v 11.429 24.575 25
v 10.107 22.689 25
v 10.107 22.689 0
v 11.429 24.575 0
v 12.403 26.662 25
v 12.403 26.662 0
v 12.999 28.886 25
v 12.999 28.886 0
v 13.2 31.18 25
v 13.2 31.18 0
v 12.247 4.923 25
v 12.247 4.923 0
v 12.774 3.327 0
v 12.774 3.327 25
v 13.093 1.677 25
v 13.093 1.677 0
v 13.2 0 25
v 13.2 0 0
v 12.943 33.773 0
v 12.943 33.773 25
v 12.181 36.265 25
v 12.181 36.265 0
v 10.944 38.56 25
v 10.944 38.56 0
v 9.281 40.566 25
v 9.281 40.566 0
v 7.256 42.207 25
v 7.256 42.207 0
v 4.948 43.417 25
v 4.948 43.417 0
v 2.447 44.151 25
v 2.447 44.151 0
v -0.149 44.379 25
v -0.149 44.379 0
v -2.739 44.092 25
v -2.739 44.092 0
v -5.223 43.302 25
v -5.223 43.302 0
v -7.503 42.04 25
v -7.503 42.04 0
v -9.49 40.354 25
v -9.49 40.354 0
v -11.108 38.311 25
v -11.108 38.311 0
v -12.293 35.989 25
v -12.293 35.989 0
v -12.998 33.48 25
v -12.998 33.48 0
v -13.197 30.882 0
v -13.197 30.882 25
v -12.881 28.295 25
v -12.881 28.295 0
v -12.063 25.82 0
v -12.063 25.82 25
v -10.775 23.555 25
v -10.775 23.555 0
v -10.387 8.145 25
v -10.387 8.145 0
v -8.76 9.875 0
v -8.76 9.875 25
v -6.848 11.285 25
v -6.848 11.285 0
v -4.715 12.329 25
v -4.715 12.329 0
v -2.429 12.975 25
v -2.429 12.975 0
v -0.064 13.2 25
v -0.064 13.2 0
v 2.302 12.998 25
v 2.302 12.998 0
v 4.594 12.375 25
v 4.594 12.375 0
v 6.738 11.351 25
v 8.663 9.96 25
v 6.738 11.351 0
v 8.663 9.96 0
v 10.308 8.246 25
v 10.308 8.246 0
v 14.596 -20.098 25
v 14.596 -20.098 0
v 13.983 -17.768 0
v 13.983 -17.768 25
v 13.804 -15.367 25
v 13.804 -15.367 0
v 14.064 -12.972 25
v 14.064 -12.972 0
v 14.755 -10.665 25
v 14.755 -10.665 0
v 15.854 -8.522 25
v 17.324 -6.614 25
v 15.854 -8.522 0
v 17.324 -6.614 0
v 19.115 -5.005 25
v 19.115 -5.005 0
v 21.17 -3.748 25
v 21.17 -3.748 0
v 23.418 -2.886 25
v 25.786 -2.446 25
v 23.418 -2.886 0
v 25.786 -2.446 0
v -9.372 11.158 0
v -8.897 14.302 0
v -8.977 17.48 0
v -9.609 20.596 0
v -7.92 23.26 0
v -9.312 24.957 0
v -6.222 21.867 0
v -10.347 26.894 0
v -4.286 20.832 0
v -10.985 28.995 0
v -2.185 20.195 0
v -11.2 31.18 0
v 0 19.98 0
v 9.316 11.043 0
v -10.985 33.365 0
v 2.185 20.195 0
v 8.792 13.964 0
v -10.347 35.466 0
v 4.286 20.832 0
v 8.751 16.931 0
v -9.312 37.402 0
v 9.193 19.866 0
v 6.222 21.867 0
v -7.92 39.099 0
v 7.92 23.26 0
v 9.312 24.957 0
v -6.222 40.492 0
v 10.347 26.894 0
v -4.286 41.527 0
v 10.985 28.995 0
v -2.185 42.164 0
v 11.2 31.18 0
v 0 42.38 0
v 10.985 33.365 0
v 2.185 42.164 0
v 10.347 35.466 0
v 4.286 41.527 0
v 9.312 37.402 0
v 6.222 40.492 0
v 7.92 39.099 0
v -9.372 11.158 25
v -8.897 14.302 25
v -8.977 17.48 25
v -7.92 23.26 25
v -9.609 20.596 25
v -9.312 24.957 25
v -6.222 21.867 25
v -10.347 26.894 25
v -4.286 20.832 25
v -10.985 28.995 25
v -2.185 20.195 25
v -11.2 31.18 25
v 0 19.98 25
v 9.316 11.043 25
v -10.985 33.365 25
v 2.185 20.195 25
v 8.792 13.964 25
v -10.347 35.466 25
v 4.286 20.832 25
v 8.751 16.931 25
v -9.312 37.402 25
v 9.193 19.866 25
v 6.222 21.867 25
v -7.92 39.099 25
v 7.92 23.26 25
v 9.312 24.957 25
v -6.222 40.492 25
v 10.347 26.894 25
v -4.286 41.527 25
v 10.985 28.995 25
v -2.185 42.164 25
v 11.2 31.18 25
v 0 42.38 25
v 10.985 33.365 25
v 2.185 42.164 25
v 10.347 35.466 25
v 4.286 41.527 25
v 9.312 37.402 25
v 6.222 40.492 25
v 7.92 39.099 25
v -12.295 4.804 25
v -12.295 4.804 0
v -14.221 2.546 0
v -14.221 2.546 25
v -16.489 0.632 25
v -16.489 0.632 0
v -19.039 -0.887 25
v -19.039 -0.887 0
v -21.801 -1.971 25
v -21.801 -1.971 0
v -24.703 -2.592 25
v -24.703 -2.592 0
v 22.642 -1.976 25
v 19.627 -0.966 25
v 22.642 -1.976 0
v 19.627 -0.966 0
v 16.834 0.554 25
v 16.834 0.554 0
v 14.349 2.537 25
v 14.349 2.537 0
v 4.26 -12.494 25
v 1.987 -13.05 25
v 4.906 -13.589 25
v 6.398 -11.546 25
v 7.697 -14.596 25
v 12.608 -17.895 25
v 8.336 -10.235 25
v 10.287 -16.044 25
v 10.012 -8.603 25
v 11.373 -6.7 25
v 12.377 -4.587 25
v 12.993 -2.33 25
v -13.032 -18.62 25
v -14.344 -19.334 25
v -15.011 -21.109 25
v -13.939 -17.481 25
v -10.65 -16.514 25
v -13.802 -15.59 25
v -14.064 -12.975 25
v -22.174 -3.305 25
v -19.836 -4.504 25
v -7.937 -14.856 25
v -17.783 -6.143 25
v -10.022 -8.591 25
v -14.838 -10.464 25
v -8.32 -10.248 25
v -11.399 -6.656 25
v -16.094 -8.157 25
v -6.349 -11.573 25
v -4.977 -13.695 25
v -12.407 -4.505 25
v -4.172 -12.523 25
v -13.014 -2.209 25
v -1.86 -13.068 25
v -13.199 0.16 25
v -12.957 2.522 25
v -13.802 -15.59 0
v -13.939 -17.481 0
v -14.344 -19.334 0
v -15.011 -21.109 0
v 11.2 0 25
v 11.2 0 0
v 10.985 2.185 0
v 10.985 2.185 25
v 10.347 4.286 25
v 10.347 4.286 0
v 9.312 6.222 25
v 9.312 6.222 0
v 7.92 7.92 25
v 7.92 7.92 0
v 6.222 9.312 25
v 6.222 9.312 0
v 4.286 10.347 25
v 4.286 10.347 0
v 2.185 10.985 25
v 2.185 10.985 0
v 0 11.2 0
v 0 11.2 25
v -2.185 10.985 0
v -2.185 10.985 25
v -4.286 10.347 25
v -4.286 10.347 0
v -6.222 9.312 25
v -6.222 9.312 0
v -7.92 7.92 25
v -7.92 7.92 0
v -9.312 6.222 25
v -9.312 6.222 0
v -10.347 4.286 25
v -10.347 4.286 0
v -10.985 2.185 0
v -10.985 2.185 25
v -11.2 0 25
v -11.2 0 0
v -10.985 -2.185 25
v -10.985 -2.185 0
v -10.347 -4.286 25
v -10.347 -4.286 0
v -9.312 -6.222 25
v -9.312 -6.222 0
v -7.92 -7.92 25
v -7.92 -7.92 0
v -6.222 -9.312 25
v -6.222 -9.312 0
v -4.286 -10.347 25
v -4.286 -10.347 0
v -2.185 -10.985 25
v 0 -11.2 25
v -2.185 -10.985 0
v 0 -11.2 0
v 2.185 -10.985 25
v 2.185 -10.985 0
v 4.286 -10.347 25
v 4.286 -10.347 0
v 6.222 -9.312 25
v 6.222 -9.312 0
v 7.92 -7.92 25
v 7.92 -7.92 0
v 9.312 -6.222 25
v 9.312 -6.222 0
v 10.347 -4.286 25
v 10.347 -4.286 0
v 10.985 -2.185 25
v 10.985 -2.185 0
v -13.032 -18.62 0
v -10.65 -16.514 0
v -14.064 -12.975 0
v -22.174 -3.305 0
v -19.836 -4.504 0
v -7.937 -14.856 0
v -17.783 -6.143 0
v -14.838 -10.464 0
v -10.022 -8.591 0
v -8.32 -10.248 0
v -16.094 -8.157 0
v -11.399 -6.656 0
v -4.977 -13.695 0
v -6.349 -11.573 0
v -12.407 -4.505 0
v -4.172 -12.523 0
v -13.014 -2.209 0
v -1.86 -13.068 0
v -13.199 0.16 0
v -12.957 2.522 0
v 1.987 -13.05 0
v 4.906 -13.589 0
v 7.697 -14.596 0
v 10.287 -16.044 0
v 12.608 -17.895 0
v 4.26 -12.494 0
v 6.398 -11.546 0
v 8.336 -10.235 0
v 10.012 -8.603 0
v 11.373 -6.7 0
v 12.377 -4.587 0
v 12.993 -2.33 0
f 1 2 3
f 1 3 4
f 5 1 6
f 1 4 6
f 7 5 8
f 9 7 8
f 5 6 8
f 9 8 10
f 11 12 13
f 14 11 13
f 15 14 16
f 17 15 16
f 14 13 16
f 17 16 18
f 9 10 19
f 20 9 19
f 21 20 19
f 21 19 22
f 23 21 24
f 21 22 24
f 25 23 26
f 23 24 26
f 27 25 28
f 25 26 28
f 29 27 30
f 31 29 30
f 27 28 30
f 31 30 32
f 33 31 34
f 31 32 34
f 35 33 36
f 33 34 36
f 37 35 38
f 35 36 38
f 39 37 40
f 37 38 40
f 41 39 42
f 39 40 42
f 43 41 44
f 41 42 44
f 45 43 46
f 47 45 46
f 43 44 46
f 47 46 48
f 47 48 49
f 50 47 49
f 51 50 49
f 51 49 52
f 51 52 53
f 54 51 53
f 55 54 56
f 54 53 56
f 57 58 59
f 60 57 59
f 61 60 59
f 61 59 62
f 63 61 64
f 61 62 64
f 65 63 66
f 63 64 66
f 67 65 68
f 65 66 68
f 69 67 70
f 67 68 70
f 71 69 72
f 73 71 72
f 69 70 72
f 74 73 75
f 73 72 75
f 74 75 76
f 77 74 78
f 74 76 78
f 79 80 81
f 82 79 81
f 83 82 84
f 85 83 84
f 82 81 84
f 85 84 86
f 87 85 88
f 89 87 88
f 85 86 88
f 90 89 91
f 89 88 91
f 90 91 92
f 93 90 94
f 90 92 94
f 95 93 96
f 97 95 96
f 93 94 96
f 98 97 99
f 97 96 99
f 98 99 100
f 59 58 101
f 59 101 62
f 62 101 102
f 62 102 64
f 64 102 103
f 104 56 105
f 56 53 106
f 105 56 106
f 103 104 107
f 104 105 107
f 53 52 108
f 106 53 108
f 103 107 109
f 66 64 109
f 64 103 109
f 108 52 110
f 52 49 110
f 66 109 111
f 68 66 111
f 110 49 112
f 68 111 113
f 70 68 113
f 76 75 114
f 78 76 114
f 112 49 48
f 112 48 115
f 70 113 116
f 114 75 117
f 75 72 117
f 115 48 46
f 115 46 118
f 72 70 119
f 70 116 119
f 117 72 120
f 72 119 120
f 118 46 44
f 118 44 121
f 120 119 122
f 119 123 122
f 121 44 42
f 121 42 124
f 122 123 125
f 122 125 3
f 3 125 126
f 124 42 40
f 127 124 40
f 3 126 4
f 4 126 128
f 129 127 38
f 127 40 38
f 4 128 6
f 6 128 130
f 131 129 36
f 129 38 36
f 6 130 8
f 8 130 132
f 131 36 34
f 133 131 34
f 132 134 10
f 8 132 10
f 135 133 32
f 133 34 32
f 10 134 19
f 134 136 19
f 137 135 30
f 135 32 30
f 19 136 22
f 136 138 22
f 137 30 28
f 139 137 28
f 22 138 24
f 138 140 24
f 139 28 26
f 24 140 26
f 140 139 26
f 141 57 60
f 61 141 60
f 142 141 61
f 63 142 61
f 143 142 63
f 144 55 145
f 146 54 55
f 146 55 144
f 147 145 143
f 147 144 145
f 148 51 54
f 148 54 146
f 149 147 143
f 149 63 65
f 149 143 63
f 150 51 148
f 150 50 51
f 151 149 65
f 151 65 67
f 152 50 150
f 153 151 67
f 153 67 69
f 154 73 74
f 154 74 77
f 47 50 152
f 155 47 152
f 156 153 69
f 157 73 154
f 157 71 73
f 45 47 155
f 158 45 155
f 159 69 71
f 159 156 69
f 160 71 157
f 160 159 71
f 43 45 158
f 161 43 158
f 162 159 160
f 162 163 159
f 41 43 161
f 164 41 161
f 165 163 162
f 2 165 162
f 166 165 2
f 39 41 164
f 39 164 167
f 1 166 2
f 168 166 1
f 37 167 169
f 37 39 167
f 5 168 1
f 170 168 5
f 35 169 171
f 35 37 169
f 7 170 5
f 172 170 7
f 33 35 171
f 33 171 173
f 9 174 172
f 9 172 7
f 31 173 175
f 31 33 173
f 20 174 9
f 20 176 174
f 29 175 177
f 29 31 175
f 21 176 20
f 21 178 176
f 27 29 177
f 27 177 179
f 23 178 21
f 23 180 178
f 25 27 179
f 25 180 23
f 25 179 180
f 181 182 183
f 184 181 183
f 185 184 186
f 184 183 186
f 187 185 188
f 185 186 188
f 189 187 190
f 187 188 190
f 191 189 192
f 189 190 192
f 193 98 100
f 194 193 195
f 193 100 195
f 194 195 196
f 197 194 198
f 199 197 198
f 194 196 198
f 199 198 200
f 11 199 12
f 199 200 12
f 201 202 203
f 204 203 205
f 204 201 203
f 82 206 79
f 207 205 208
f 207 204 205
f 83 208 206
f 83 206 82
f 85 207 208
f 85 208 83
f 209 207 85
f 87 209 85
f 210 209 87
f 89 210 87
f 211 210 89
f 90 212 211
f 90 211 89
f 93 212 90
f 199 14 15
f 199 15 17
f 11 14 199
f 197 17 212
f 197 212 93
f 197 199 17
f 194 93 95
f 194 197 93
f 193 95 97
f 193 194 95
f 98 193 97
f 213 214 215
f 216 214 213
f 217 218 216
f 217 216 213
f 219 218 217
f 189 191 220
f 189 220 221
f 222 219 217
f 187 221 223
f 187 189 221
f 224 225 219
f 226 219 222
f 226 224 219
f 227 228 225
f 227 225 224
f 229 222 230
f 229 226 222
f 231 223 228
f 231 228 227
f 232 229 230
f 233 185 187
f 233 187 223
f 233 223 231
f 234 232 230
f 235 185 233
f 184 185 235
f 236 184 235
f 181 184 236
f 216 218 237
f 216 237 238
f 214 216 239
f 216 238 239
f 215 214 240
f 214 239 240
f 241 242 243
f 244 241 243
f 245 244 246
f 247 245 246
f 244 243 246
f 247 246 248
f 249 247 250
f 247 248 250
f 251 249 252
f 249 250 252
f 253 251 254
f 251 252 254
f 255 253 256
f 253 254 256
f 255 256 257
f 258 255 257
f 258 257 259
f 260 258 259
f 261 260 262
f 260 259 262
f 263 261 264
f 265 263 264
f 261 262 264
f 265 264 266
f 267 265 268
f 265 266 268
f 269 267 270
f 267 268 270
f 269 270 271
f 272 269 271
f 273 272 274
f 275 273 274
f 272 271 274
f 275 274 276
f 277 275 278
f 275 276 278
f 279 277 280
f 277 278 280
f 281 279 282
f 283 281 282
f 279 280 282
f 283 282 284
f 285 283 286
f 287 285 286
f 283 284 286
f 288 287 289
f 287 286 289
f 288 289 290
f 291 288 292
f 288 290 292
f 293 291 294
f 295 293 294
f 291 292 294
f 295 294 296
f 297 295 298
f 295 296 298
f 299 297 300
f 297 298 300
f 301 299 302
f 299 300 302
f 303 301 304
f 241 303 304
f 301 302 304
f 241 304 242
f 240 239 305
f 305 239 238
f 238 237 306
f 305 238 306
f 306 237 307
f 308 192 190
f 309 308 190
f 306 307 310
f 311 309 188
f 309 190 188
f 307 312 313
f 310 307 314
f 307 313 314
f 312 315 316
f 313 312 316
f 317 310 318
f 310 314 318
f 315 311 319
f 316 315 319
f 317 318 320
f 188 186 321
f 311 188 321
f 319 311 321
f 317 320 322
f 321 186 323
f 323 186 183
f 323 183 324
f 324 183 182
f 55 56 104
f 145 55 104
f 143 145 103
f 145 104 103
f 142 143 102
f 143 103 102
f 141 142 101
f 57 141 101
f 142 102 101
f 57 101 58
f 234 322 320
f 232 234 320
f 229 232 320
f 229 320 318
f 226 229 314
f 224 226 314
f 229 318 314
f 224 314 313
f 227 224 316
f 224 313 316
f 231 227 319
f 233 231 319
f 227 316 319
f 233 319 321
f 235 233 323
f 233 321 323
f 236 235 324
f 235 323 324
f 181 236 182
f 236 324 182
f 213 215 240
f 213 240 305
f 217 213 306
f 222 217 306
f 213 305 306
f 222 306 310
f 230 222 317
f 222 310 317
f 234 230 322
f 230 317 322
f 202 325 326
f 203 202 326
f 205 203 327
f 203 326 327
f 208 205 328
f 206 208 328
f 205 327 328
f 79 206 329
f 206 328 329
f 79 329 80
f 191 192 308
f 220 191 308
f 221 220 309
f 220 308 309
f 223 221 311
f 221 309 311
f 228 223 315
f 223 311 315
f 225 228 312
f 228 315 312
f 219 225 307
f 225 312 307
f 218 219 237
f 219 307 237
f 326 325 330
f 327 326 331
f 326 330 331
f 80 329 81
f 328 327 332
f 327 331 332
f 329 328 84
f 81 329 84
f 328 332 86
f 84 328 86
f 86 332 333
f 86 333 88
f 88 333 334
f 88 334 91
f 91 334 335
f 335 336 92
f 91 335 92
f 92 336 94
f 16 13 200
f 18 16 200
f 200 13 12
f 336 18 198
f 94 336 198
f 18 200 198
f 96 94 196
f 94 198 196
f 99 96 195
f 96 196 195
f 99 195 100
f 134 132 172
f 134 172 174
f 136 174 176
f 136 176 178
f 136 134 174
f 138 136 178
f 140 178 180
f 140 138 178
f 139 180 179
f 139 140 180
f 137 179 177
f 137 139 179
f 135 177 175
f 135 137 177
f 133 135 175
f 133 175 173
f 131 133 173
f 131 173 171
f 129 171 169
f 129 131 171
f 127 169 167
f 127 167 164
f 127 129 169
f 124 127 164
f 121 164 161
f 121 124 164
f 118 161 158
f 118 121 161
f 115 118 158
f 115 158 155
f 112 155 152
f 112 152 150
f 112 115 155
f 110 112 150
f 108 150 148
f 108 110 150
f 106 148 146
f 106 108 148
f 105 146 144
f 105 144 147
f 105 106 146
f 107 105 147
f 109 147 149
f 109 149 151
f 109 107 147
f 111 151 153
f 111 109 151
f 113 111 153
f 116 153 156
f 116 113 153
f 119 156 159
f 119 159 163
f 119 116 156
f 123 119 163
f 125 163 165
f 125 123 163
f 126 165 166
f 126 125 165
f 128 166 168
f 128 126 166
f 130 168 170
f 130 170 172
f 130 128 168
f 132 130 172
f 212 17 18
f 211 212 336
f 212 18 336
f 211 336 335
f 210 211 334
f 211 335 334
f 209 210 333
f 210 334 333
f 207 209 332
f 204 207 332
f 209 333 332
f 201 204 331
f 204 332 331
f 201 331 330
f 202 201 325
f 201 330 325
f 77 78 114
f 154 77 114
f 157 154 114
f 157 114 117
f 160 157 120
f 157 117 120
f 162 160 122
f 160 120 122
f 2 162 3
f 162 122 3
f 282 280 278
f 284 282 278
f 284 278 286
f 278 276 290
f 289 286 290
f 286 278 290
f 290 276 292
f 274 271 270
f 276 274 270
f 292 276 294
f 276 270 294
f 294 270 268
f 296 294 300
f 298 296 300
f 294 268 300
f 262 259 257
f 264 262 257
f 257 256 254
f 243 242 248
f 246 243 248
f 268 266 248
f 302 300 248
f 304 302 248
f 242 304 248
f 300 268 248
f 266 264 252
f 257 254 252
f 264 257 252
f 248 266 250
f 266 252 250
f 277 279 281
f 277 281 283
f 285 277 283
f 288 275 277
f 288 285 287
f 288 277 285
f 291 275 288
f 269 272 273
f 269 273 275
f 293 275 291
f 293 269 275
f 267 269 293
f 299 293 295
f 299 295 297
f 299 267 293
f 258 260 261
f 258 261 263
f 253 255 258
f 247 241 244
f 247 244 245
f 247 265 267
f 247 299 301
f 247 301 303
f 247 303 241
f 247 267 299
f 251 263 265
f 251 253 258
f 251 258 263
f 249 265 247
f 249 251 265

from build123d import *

# Parameters (mm, degrees)
F0_R     = 11.2
F2_DEPTH = 25


with BuildPart() as f2:
    # F0 (on Top) → F2 (new body)
    with BuildSketch(Plane.XY):
        with BuildLine():
            ThreePointArc((-10.7748828951, 23.5545960435), (-0.5465539807, 17.9909996106), (10.1070365837, 22.6892254181))
            ThreePointArc((10.1070365837, 22.6892254181), (12.4026788015, 26.6615429343), (13.2, 31.1796795577))
            ThreePointArc((13.2, 31.1796795577), (-4.0007215465, 43.7587982513), (-10.7748828951, 23.5545960435))
        make_face()
        with Locations((0, 31.1796795577)):
            Circle(F0_R, mode=Mode.SUBTRACT)
        with BuildLine():
            ThreePointArc((-10.3874815396, 8.144951029), (-0.0643990559, 13.1998429067), (10.3075141907, 8.2459172448))
            ThreePointArc((10.3075141907, 8.2459172448), (8.7111098325, 15.4468040885), (10.1070365837, 22.6892254181))
            ThreePointArc((10.1070365837, 22.6892254181), (-0.5465539807, 17.9909996106), (-10.7748828951, 23.5545960435))
            ThreePointArc((-10.7748828951, 23.5545960435), (-8.867002021, 15.8928683468), (-10.3874815396, 8.144951029))
        make_face()
    extrude(amount=F2_DEPTH)


with BuildPart() as f2b:
    # F0 (on Top) → F2, piece 2 (new body)
    with BuildSketch(Plane.XY):
        with BuildLine():
            ThreePointArc((-15.0114371021, -21.1086203317), (-9.3301267168, -15.625483179), (-1.8599937339, -13.0682984091))
            ThreePointArc((-1.8599937339, -13.0682984091), (-11.3991997552, -6.6556926717), (-12.2949309069, 4.8036105166))
            ThreePointArc((-12.2949309069, 4.8036105166), (-17.7328796642, -0.1793596341), (-24.7029638961, -2.5916622706))
            ThreePointArc((-24.7029638961, -2.5916622706), (-16.8882340844, -7.1078731735), (-13.8023945788, -15.5898397788))
            ThreePointArc((-13.8023945788, -15.5898397788), (-14.1081974597, -18.4146726329), (-15.0114371021, -21.1086203317))
        make_face()
    extrude(amount=F2_DEPTH)


with BuildPart() as f2c:
    # F0 (on Top) → F2, piece 3 (new body)
    with BuildSketch(Plane.XY):
        Circle(F0_R)
    extrude(amount=F2_DEPTH)


with BuildPart() as f2d:
    # F0 (on Top) → F2, piece 4 (new body)
    with BuildSketch(Plane.XY):
        with BuildLine():
            ThreePointArc((12.2474752735, 4.9233473801), (12.9596812, 2.5073219169), (13.2, 0))
            ThreePointArc((13.2, 0), (10.0118405064, -8.6025025239), (1.9874167161, -13.0495277614))
            ThreePointArc((1.9874167161, -13.0495277614), (9.0217698316, -15.2674444544), (14.5959273124, -20.0975631475))
            ThreePointArc((14.5959273124, -20.0975631475), (15.8539396926, -8.5221701735), (25.7863199971, -2.4459757118))
            ThreePointArc((25.7863199971, -2.4459757118), (18.1971287378, -0.2673851678), (12.2474752735, 4.9233473801))
        make_face()
    extrude(amount=F2_DEPTH)


solid = Compound([f2.part, f2b.part, f2c.part, f2d.part])
